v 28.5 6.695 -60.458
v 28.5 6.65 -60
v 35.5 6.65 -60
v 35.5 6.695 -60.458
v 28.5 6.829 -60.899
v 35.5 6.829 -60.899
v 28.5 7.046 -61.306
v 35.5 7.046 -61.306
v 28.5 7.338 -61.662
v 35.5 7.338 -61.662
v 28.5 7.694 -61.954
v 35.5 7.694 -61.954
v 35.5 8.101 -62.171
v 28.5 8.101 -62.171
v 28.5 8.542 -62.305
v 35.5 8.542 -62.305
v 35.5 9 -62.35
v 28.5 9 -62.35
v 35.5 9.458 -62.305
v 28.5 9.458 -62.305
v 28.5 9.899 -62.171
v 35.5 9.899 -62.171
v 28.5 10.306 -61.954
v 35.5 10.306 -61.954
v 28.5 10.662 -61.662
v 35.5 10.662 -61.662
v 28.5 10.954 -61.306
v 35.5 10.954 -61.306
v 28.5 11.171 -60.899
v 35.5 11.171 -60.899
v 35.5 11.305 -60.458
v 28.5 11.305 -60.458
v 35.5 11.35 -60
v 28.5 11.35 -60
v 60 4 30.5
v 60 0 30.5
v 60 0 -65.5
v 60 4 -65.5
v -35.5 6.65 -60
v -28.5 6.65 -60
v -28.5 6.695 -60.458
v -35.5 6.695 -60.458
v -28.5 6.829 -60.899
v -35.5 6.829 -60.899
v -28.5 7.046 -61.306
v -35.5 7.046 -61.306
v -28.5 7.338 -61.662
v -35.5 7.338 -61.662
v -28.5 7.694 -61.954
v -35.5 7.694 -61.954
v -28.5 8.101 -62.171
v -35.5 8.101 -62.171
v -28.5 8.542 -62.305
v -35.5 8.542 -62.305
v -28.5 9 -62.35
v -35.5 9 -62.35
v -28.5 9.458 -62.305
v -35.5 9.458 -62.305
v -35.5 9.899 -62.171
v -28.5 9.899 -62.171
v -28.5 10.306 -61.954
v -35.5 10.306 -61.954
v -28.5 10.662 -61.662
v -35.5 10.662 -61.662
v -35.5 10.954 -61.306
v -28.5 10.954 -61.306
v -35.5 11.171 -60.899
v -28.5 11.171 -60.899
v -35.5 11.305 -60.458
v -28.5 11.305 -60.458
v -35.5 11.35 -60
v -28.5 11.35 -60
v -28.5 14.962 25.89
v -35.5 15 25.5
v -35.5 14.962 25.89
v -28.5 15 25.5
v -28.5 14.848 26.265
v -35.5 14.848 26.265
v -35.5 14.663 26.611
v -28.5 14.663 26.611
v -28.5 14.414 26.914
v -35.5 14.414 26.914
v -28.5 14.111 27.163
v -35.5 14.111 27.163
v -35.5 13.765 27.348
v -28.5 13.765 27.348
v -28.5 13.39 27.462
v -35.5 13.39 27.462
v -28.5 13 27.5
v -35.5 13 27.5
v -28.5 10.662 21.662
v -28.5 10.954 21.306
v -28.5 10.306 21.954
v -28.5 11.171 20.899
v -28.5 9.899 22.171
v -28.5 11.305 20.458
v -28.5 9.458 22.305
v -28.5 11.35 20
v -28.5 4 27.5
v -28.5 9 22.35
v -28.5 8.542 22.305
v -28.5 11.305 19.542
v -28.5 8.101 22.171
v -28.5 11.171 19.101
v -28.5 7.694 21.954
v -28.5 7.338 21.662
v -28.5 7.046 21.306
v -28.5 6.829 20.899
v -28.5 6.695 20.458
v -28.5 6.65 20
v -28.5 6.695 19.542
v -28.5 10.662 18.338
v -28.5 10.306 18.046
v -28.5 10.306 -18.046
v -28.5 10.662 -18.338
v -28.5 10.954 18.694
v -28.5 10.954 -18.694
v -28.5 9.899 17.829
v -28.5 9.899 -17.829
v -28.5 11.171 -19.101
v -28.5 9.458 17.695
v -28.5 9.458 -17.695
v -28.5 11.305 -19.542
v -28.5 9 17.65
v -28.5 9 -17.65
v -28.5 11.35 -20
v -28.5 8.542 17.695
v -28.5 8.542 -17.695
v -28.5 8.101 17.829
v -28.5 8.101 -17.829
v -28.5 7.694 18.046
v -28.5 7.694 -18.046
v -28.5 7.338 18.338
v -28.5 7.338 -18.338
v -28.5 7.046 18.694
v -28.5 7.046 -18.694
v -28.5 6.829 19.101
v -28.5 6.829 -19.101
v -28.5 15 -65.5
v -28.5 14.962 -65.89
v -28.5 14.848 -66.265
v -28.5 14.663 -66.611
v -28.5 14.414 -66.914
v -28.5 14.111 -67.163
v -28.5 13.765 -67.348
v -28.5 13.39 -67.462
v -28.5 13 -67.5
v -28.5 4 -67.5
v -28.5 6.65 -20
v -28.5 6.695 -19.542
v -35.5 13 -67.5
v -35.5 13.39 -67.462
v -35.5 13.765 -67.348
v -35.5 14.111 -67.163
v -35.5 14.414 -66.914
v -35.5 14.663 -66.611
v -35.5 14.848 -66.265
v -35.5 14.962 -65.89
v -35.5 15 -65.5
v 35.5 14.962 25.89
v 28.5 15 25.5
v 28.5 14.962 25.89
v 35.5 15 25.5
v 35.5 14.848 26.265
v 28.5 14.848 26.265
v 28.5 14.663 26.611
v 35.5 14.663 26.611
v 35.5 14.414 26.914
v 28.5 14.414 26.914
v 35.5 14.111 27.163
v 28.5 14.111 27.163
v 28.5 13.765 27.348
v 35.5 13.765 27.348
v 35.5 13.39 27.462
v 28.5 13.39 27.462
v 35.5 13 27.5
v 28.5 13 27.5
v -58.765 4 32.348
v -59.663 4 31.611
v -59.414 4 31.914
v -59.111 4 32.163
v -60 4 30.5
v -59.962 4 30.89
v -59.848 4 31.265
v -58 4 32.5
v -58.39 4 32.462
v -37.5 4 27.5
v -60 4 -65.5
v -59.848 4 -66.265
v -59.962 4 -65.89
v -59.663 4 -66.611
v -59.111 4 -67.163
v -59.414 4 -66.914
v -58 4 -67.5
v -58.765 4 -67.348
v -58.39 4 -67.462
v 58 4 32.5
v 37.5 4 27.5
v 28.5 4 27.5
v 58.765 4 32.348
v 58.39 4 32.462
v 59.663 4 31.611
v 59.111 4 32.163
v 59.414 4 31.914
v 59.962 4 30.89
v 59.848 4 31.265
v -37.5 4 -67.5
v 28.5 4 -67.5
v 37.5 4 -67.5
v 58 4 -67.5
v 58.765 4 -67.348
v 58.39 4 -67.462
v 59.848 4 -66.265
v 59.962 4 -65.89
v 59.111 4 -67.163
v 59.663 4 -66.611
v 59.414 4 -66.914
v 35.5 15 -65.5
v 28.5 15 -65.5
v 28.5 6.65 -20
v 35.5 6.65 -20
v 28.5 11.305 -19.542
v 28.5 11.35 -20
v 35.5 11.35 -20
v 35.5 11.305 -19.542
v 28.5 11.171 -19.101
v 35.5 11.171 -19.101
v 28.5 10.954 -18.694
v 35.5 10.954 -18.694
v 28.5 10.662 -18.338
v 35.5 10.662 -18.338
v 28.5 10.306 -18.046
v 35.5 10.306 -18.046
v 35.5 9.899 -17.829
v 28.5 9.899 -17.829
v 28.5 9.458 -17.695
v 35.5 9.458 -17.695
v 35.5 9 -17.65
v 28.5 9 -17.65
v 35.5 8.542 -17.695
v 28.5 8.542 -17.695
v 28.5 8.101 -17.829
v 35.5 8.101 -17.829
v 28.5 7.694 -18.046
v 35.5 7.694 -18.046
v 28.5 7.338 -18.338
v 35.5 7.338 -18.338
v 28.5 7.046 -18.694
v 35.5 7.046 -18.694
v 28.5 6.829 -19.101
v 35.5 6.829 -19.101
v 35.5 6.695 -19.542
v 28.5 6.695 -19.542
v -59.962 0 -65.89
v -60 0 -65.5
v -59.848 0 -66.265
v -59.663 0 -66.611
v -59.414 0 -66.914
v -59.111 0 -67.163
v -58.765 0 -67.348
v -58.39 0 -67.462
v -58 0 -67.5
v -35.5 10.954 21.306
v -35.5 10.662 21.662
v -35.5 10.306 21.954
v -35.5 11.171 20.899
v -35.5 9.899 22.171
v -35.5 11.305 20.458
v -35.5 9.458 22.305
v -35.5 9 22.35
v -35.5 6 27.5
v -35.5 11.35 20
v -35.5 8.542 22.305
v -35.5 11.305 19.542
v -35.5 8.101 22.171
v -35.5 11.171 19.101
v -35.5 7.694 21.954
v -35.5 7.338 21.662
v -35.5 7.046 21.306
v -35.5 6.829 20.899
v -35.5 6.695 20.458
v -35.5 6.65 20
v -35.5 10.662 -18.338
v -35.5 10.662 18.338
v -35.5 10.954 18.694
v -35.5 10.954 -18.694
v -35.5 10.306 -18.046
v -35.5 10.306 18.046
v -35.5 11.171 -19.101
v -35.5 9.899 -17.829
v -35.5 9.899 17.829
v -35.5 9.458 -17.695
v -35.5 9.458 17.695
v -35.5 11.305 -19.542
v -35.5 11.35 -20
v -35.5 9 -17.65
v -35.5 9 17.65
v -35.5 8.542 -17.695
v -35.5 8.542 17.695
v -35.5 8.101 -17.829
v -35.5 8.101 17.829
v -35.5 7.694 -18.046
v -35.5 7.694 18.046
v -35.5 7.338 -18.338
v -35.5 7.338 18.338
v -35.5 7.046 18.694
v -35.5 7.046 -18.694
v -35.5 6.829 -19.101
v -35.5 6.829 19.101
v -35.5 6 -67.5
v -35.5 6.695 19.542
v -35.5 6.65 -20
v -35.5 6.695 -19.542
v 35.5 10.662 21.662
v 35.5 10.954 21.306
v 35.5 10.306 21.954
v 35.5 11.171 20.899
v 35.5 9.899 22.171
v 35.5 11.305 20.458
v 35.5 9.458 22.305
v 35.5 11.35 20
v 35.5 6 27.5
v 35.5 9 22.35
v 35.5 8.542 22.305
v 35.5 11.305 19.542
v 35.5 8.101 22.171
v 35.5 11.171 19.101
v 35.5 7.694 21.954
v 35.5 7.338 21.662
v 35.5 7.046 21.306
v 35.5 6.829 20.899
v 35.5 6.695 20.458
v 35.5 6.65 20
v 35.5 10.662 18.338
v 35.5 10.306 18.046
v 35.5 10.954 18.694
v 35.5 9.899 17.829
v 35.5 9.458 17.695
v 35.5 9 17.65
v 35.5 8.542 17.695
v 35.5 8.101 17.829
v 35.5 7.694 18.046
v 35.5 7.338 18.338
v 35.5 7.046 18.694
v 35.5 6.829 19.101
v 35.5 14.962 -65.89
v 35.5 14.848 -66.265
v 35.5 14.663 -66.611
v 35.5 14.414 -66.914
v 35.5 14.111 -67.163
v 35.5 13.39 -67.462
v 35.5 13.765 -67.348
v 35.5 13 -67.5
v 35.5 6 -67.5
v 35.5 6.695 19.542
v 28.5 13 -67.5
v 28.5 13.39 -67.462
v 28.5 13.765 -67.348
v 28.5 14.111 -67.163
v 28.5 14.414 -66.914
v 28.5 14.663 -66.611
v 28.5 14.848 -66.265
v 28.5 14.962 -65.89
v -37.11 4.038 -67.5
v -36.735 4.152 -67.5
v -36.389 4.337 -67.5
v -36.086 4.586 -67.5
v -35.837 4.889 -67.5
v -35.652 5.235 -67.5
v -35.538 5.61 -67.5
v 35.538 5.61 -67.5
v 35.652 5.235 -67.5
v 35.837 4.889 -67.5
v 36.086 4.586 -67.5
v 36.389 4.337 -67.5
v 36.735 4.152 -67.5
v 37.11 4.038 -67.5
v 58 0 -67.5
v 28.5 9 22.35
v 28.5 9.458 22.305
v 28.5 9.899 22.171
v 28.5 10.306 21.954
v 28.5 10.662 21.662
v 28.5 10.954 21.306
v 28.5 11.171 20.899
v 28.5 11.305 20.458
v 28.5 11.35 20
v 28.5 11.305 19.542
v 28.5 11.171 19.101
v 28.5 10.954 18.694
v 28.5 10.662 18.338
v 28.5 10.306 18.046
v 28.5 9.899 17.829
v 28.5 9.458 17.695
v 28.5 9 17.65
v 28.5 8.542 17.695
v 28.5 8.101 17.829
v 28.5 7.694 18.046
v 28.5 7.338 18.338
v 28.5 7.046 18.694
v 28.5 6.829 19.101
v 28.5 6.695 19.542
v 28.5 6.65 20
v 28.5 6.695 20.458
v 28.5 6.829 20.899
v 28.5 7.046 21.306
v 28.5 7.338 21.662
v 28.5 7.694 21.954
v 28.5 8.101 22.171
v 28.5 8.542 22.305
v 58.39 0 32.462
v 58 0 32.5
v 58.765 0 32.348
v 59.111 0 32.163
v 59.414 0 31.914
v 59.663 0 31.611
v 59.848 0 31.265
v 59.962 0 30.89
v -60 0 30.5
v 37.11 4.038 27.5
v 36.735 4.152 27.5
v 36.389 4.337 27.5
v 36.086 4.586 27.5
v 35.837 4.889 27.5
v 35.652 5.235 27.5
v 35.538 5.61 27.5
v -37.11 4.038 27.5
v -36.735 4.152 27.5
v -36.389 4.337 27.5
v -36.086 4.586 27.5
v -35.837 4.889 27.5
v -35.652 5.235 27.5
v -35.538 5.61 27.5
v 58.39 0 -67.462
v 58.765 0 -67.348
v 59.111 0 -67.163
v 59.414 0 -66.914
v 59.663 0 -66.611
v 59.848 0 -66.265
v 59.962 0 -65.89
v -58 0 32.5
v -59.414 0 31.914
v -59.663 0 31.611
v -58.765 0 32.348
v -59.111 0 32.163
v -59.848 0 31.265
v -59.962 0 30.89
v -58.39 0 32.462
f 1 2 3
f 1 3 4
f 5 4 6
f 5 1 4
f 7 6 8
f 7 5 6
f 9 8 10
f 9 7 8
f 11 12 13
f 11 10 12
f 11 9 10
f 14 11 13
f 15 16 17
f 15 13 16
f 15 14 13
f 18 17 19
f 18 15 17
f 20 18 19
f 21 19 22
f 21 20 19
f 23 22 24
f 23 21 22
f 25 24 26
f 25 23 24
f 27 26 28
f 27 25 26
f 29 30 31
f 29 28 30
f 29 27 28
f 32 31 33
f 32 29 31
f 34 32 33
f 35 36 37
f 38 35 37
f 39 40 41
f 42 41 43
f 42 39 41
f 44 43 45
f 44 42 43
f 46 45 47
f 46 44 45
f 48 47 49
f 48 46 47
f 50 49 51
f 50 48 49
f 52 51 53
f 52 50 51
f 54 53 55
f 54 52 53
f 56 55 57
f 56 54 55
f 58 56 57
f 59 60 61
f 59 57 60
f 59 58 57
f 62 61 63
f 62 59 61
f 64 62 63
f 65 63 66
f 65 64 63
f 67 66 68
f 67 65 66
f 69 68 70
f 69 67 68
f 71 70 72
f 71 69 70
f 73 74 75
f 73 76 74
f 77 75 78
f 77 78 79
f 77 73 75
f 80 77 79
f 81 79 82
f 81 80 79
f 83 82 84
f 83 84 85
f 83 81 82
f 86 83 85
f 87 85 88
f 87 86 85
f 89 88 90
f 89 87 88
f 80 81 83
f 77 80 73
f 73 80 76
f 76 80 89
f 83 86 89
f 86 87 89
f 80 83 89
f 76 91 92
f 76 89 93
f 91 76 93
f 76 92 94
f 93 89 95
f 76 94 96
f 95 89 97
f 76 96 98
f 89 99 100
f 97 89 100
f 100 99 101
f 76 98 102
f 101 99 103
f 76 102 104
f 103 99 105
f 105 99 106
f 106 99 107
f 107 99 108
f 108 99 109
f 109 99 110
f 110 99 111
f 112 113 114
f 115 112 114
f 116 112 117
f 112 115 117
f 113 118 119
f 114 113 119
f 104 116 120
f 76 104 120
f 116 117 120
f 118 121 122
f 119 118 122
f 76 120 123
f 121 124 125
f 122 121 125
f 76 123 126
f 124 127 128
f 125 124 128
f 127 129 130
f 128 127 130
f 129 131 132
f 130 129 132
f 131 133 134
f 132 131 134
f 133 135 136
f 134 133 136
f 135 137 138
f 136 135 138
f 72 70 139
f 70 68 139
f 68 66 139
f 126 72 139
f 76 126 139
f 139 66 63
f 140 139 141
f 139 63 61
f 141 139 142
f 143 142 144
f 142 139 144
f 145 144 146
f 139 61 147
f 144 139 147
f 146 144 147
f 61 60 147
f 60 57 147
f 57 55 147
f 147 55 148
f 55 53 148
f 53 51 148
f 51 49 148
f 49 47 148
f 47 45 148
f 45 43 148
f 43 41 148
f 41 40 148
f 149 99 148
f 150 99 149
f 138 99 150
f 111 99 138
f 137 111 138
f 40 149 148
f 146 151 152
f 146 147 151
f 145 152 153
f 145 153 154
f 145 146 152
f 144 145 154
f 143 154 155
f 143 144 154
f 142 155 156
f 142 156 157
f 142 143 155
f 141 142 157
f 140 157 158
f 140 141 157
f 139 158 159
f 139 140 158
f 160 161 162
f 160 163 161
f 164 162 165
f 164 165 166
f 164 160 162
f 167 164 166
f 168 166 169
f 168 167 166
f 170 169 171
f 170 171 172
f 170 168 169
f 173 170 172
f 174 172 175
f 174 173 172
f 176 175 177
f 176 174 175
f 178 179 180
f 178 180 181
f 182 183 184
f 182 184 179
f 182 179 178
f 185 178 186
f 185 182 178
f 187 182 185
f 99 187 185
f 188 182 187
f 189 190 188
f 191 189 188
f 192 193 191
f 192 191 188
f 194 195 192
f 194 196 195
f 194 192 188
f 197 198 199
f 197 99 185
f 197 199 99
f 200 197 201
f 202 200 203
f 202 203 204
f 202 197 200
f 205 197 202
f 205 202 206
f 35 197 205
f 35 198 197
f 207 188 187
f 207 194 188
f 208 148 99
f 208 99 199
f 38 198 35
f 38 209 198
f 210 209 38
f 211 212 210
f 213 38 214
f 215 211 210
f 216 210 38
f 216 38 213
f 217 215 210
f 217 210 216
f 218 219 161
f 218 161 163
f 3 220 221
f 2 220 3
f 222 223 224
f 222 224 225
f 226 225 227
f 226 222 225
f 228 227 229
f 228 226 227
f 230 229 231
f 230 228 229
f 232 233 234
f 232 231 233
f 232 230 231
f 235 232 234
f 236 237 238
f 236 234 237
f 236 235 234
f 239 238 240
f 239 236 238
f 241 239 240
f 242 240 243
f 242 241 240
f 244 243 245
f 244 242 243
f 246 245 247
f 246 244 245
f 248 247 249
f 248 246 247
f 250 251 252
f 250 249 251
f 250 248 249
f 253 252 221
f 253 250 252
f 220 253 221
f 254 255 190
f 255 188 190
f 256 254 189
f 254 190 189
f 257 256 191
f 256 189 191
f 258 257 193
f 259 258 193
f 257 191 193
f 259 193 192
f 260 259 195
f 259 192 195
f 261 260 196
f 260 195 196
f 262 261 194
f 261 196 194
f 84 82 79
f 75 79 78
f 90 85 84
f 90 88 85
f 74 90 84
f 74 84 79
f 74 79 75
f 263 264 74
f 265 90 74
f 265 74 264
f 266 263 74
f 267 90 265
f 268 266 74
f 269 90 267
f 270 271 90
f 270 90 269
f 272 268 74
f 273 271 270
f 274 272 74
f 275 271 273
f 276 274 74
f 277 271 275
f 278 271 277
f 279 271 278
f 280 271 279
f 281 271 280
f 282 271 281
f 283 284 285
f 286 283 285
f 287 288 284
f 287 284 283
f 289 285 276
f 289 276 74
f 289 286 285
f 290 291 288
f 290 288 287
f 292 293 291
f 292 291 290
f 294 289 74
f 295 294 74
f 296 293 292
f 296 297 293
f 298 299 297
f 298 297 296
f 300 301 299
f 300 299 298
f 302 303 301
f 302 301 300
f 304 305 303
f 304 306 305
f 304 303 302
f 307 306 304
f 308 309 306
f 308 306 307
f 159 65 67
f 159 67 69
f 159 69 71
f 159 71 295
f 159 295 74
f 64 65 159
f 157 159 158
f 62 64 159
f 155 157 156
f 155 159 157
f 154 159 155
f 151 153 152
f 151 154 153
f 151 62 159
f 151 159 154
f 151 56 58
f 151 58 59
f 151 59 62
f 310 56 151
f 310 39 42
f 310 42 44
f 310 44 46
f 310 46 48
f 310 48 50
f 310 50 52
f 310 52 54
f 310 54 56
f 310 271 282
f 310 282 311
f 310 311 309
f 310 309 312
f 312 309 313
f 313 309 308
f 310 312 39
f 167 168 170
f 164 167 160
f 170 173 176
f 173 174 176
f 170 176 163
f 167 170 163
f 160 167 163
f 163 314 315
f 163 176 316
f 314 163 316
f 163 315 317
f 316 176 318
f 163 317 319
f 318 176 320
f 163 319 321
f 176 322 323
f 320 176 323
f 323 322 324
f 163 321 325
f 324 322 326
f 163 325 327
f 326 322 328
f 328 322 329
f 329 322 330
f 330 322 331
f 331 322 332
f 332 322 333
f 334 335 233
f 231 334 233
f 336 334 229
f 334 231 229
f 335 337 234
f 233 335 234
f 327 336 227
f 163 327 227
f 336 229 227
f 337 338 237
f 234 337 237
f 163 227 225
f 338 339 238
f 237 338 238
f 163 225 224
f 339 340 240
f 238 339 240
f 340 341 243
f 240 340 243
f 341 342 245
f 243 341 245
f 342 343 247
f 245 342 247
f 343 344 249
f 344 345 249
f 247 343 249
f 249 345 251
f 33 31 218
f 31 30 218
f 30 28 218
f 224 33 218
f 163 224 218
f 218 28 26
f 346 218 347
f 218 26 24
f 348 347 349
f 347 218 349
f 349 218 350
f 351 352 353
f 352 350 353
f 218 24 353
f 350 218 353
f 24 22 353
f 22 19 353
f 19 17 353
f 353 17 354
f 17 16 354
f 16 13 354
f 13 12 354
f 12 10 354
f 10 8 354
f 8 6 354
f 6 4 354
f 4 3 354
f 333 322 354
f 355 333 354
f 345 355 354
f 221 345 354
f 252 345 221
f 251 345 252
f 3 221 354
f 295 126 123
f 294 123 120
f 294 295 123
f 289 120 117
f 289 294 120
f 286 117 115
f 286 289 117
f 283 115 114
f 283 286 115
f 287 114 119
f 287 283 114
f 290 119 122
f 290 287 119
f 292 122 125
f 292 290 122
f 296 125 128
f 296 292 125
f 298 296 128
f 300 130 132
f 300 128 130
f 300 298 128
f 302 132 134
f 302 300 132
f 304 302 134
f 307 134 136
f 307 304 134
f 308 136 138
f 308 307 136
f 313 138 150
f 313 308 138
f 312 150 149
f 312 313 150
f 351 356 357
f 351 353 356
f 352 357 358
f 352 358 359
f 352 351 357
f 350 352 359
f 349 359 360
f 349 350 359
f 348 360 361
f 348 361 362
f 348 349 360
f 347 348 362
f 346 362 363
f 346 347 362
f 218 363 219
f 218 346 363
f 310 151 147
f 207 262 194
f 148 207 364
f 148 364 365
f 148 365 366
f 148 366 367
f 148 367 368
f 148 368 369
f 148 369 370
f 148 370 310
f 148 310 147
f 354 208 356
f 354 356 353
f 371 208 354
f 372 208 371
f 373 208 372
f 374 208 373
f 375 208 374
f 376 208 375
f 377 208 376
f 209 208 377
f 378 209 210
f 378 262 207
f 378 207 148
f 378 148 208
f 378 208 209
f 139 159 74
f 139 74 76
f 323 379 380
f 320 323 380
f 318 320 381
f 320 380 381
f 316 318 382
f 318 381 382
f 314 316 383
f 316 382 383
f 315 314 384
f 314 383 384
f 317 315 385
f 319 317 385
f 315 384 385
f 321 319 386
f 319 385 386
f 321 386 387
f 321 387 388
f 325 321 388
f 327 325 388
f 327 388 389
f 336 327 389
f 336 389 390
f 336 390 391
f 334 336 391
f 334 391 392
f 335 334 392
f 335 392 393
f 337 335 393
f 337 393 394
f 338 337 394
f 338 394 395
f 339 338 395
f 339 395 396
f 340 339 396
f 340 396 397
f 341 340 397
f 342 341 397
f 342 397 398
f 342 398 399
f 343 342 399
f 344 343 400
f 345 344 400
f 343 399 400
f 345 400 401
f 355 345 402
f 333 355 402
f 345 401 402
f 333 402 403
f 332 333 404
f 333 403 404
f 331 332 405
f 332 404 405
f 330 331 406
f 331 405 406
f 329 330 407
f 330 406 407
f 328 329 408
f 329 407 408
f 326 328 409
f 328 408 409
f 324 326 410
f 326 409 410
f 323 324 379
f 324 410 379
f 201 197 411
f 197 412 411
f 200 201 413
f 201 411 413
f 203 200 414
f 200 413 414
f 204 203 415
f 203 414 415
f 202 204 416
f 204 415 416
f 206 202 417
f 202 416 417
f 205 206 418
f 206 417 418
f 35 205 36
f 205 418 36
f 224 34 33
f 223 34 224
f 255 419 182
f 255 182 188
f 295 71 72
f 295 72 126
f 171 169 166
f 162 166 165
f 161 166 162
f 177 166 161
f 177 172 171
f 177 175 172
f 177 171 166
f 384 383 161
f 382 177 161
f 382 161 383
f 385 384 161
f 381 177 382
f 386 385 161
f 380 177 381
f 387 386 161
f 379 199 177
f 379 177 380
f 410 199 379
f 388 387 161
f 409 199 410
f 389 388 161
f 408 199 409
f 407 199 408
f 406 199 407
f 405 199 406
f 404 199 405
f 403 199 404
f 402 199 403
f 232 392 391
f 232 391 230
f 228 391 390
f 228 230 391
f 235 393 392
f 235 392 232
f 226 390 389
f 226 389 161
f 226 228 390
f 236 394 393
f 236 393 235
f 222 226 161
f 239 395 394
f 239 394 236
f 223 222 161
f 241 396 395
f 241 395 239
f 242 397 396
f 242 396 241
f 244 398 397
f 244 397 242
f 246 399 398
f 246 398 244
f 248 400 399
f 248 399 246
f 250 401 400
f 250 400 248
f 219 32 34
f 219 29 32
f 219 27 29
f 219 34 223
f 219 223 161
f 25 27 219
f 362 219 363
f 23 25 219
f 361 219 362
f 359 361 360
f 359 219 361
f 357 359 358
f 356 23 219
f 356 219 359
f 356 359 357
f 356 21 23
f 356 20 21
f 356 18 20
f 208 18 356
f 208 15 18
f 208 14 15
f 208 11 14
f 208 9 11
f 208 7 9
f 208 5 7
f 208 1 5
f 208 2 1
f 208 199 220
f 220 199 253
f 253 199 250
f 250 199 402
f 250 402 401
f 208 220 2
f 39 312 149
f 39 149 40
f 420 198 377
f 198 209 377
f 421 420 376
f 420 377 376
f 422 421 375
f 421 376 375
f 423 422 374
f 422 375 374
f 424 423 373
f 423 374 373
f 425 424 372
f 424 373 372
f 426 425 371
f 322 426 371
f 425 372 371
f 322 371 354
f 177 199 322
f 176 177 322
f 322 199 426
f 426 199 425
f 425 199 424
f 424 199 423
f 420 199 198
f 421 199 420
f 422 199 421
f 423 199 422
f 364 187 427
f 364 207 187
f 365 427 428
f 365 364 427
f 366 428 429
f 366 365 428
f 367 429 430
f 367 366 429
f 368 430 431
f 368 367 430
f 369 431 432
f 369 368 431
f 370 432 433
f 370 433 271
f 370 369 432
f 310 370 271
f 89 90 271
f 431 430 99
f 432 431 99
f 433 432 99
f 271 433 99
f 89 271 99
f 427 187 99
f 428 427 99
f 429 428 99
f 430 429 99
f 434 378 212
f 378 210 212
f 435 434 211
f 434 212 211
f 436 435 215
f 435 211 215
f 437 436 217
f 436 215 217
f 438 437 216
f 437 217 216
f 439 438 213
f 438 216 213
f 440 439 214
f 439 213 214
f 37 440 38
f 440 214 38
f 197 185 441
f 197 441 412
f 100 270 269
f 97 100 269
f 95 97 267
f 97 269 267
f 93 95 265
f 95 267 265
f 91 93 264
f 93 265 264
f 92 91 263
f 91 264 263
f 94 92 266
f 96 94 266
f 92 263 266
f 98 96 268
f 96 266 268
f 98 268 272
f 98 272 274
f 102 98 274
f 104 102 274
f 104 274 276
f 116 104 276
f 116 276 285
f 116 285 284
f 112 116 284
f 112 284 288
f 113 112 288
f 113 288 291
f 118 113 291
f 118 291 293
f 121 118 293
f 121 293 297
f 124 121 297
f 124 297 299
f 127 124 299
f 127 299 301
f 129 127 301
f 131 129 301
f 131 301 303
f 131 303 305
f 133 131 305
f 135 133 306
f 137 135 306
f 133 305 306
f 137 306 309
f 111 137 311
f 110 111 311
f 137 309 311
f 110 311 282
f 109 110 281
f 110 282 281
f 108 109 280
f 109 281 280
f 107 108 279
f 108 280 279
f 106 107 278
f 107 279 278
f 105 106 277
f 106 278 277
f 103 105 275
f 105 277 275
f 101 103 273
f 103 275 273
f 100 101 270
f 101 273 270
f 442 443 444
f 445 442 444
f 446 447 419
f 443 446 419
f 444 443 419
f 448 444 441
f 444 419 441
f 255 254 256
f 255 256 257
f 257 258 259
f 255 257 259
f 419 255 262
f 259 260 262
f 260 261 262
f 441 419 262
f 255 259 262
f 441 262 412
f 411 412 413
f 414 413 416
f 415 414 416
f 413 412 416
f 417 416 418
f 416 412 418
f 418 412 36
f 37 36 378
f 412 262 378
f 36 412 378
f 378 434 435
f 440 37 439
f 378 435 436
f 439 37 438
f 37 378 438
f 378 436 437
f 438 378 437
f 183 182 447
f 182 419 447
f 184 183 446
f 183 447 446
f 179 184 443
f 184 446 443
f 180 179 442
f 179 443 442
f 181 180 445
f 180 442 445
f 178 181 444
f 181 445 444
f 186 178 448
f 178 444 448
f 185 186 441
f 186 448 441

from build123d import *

# Parameters (mm, degrees)
SKETCH_1_W          = 120
SKETCH_1_H          = 135
EXTRUDE_1_DEPTH     = 4
SKETCH_2_W          = 7
SKETCH_2_H          = 95
EXTRUDE_2_DEPTH     = 11
SKETCH_4_R          = 2.35
CUT_EXTRUDE_2_DEPTH = 118.904622471
SKETCH_5_W          = 120
SKETCH_5_H          = 35
CUT_EXTRUDE_3_DEPTH = 10
FILLET_1_R          = 2


with BuildPart() as part:
    # 草图1 → 凸台-拉伸1 (new body)
    with BuildSketch(Plane(origin=(0, 0, 0), x_dir=(1, 0, 0), z_dir=(0, 1, 0))):
        Rectangle(SKETCH_1_W, SKETCH_1_H)
    extrude(amount=EXTRUDE_1_DEPTH)

    # 草图2 → 凸台-拉伸2 (add)
    with BuildSketch(Plane(origin=(0, 4, 0), x_dir=(1, 0, 0), z_dir=(0, 1, 0))):
        with Locations((-32, 20)):
            Rectangle(SKETCH_2_W, SKETCH_2_H)
        with Locations((32, 20)):
            Rectangle(SKETCH_2_W, SKETCH_2_H)
    extrude(amount=EXTRUDE_2_DEPTH)

    # 草图4 → 切除-拉伸2 (cut, through all)
    with BuildSketch(Plane.ZY.offset(35.5)):
        with Locations((20, 9)):
            Circle(SKETCH_4_R)
        with BuildLine():
            Line((-60, 11.35), (-20, 11.35))
            ThreePointArc((-20, 11.35), (-17.65, 9), (-20, 6.65))
            Line((-20, 6.65), (-60, 6.65))
            ThreePointArc((-60, 6.65), (-62.35, 9), (-60, 11.35))
        make_face()
    extrude(amount=-CUT_EXTRUDE_2_DEPTH, mode=Mode.SUBTRACT)

    # 草图5 → 切除-拉伸3 (cut)
    with BuildSketch(Plane(origin=(0, 4, 0), x_dir=(1, 0, 0), z_dir=(0, 1, 0))):
        with Locations((0, -50)):
            Rectangle(SKETCH_5_W, SKETCH_5_H)
    extrude(amount=-CUT_EXTRUDE_3_DEPTH, mode=Mode.SUBTRACT)

    # 圆角1
    fillet_1_edges = [part.edges().sort_by_distance(p)[0] for p in [
        (-35.5, 4, -20),
        (-32, 15, -67.5),
        (-32, 15, 27.5),
        (35.5, 4, -20),
        (32, 15, -67.5),
        (32, 15, 27.5),
        (-60, 2, -67.5),
        (60, 2, -67.5),
        (60, 2, 32.5),
        (-60, 2, 32.5),
    ]]
    fillet(fillet_1_edges, radius=FILLET_1_R)


solid = part.part
